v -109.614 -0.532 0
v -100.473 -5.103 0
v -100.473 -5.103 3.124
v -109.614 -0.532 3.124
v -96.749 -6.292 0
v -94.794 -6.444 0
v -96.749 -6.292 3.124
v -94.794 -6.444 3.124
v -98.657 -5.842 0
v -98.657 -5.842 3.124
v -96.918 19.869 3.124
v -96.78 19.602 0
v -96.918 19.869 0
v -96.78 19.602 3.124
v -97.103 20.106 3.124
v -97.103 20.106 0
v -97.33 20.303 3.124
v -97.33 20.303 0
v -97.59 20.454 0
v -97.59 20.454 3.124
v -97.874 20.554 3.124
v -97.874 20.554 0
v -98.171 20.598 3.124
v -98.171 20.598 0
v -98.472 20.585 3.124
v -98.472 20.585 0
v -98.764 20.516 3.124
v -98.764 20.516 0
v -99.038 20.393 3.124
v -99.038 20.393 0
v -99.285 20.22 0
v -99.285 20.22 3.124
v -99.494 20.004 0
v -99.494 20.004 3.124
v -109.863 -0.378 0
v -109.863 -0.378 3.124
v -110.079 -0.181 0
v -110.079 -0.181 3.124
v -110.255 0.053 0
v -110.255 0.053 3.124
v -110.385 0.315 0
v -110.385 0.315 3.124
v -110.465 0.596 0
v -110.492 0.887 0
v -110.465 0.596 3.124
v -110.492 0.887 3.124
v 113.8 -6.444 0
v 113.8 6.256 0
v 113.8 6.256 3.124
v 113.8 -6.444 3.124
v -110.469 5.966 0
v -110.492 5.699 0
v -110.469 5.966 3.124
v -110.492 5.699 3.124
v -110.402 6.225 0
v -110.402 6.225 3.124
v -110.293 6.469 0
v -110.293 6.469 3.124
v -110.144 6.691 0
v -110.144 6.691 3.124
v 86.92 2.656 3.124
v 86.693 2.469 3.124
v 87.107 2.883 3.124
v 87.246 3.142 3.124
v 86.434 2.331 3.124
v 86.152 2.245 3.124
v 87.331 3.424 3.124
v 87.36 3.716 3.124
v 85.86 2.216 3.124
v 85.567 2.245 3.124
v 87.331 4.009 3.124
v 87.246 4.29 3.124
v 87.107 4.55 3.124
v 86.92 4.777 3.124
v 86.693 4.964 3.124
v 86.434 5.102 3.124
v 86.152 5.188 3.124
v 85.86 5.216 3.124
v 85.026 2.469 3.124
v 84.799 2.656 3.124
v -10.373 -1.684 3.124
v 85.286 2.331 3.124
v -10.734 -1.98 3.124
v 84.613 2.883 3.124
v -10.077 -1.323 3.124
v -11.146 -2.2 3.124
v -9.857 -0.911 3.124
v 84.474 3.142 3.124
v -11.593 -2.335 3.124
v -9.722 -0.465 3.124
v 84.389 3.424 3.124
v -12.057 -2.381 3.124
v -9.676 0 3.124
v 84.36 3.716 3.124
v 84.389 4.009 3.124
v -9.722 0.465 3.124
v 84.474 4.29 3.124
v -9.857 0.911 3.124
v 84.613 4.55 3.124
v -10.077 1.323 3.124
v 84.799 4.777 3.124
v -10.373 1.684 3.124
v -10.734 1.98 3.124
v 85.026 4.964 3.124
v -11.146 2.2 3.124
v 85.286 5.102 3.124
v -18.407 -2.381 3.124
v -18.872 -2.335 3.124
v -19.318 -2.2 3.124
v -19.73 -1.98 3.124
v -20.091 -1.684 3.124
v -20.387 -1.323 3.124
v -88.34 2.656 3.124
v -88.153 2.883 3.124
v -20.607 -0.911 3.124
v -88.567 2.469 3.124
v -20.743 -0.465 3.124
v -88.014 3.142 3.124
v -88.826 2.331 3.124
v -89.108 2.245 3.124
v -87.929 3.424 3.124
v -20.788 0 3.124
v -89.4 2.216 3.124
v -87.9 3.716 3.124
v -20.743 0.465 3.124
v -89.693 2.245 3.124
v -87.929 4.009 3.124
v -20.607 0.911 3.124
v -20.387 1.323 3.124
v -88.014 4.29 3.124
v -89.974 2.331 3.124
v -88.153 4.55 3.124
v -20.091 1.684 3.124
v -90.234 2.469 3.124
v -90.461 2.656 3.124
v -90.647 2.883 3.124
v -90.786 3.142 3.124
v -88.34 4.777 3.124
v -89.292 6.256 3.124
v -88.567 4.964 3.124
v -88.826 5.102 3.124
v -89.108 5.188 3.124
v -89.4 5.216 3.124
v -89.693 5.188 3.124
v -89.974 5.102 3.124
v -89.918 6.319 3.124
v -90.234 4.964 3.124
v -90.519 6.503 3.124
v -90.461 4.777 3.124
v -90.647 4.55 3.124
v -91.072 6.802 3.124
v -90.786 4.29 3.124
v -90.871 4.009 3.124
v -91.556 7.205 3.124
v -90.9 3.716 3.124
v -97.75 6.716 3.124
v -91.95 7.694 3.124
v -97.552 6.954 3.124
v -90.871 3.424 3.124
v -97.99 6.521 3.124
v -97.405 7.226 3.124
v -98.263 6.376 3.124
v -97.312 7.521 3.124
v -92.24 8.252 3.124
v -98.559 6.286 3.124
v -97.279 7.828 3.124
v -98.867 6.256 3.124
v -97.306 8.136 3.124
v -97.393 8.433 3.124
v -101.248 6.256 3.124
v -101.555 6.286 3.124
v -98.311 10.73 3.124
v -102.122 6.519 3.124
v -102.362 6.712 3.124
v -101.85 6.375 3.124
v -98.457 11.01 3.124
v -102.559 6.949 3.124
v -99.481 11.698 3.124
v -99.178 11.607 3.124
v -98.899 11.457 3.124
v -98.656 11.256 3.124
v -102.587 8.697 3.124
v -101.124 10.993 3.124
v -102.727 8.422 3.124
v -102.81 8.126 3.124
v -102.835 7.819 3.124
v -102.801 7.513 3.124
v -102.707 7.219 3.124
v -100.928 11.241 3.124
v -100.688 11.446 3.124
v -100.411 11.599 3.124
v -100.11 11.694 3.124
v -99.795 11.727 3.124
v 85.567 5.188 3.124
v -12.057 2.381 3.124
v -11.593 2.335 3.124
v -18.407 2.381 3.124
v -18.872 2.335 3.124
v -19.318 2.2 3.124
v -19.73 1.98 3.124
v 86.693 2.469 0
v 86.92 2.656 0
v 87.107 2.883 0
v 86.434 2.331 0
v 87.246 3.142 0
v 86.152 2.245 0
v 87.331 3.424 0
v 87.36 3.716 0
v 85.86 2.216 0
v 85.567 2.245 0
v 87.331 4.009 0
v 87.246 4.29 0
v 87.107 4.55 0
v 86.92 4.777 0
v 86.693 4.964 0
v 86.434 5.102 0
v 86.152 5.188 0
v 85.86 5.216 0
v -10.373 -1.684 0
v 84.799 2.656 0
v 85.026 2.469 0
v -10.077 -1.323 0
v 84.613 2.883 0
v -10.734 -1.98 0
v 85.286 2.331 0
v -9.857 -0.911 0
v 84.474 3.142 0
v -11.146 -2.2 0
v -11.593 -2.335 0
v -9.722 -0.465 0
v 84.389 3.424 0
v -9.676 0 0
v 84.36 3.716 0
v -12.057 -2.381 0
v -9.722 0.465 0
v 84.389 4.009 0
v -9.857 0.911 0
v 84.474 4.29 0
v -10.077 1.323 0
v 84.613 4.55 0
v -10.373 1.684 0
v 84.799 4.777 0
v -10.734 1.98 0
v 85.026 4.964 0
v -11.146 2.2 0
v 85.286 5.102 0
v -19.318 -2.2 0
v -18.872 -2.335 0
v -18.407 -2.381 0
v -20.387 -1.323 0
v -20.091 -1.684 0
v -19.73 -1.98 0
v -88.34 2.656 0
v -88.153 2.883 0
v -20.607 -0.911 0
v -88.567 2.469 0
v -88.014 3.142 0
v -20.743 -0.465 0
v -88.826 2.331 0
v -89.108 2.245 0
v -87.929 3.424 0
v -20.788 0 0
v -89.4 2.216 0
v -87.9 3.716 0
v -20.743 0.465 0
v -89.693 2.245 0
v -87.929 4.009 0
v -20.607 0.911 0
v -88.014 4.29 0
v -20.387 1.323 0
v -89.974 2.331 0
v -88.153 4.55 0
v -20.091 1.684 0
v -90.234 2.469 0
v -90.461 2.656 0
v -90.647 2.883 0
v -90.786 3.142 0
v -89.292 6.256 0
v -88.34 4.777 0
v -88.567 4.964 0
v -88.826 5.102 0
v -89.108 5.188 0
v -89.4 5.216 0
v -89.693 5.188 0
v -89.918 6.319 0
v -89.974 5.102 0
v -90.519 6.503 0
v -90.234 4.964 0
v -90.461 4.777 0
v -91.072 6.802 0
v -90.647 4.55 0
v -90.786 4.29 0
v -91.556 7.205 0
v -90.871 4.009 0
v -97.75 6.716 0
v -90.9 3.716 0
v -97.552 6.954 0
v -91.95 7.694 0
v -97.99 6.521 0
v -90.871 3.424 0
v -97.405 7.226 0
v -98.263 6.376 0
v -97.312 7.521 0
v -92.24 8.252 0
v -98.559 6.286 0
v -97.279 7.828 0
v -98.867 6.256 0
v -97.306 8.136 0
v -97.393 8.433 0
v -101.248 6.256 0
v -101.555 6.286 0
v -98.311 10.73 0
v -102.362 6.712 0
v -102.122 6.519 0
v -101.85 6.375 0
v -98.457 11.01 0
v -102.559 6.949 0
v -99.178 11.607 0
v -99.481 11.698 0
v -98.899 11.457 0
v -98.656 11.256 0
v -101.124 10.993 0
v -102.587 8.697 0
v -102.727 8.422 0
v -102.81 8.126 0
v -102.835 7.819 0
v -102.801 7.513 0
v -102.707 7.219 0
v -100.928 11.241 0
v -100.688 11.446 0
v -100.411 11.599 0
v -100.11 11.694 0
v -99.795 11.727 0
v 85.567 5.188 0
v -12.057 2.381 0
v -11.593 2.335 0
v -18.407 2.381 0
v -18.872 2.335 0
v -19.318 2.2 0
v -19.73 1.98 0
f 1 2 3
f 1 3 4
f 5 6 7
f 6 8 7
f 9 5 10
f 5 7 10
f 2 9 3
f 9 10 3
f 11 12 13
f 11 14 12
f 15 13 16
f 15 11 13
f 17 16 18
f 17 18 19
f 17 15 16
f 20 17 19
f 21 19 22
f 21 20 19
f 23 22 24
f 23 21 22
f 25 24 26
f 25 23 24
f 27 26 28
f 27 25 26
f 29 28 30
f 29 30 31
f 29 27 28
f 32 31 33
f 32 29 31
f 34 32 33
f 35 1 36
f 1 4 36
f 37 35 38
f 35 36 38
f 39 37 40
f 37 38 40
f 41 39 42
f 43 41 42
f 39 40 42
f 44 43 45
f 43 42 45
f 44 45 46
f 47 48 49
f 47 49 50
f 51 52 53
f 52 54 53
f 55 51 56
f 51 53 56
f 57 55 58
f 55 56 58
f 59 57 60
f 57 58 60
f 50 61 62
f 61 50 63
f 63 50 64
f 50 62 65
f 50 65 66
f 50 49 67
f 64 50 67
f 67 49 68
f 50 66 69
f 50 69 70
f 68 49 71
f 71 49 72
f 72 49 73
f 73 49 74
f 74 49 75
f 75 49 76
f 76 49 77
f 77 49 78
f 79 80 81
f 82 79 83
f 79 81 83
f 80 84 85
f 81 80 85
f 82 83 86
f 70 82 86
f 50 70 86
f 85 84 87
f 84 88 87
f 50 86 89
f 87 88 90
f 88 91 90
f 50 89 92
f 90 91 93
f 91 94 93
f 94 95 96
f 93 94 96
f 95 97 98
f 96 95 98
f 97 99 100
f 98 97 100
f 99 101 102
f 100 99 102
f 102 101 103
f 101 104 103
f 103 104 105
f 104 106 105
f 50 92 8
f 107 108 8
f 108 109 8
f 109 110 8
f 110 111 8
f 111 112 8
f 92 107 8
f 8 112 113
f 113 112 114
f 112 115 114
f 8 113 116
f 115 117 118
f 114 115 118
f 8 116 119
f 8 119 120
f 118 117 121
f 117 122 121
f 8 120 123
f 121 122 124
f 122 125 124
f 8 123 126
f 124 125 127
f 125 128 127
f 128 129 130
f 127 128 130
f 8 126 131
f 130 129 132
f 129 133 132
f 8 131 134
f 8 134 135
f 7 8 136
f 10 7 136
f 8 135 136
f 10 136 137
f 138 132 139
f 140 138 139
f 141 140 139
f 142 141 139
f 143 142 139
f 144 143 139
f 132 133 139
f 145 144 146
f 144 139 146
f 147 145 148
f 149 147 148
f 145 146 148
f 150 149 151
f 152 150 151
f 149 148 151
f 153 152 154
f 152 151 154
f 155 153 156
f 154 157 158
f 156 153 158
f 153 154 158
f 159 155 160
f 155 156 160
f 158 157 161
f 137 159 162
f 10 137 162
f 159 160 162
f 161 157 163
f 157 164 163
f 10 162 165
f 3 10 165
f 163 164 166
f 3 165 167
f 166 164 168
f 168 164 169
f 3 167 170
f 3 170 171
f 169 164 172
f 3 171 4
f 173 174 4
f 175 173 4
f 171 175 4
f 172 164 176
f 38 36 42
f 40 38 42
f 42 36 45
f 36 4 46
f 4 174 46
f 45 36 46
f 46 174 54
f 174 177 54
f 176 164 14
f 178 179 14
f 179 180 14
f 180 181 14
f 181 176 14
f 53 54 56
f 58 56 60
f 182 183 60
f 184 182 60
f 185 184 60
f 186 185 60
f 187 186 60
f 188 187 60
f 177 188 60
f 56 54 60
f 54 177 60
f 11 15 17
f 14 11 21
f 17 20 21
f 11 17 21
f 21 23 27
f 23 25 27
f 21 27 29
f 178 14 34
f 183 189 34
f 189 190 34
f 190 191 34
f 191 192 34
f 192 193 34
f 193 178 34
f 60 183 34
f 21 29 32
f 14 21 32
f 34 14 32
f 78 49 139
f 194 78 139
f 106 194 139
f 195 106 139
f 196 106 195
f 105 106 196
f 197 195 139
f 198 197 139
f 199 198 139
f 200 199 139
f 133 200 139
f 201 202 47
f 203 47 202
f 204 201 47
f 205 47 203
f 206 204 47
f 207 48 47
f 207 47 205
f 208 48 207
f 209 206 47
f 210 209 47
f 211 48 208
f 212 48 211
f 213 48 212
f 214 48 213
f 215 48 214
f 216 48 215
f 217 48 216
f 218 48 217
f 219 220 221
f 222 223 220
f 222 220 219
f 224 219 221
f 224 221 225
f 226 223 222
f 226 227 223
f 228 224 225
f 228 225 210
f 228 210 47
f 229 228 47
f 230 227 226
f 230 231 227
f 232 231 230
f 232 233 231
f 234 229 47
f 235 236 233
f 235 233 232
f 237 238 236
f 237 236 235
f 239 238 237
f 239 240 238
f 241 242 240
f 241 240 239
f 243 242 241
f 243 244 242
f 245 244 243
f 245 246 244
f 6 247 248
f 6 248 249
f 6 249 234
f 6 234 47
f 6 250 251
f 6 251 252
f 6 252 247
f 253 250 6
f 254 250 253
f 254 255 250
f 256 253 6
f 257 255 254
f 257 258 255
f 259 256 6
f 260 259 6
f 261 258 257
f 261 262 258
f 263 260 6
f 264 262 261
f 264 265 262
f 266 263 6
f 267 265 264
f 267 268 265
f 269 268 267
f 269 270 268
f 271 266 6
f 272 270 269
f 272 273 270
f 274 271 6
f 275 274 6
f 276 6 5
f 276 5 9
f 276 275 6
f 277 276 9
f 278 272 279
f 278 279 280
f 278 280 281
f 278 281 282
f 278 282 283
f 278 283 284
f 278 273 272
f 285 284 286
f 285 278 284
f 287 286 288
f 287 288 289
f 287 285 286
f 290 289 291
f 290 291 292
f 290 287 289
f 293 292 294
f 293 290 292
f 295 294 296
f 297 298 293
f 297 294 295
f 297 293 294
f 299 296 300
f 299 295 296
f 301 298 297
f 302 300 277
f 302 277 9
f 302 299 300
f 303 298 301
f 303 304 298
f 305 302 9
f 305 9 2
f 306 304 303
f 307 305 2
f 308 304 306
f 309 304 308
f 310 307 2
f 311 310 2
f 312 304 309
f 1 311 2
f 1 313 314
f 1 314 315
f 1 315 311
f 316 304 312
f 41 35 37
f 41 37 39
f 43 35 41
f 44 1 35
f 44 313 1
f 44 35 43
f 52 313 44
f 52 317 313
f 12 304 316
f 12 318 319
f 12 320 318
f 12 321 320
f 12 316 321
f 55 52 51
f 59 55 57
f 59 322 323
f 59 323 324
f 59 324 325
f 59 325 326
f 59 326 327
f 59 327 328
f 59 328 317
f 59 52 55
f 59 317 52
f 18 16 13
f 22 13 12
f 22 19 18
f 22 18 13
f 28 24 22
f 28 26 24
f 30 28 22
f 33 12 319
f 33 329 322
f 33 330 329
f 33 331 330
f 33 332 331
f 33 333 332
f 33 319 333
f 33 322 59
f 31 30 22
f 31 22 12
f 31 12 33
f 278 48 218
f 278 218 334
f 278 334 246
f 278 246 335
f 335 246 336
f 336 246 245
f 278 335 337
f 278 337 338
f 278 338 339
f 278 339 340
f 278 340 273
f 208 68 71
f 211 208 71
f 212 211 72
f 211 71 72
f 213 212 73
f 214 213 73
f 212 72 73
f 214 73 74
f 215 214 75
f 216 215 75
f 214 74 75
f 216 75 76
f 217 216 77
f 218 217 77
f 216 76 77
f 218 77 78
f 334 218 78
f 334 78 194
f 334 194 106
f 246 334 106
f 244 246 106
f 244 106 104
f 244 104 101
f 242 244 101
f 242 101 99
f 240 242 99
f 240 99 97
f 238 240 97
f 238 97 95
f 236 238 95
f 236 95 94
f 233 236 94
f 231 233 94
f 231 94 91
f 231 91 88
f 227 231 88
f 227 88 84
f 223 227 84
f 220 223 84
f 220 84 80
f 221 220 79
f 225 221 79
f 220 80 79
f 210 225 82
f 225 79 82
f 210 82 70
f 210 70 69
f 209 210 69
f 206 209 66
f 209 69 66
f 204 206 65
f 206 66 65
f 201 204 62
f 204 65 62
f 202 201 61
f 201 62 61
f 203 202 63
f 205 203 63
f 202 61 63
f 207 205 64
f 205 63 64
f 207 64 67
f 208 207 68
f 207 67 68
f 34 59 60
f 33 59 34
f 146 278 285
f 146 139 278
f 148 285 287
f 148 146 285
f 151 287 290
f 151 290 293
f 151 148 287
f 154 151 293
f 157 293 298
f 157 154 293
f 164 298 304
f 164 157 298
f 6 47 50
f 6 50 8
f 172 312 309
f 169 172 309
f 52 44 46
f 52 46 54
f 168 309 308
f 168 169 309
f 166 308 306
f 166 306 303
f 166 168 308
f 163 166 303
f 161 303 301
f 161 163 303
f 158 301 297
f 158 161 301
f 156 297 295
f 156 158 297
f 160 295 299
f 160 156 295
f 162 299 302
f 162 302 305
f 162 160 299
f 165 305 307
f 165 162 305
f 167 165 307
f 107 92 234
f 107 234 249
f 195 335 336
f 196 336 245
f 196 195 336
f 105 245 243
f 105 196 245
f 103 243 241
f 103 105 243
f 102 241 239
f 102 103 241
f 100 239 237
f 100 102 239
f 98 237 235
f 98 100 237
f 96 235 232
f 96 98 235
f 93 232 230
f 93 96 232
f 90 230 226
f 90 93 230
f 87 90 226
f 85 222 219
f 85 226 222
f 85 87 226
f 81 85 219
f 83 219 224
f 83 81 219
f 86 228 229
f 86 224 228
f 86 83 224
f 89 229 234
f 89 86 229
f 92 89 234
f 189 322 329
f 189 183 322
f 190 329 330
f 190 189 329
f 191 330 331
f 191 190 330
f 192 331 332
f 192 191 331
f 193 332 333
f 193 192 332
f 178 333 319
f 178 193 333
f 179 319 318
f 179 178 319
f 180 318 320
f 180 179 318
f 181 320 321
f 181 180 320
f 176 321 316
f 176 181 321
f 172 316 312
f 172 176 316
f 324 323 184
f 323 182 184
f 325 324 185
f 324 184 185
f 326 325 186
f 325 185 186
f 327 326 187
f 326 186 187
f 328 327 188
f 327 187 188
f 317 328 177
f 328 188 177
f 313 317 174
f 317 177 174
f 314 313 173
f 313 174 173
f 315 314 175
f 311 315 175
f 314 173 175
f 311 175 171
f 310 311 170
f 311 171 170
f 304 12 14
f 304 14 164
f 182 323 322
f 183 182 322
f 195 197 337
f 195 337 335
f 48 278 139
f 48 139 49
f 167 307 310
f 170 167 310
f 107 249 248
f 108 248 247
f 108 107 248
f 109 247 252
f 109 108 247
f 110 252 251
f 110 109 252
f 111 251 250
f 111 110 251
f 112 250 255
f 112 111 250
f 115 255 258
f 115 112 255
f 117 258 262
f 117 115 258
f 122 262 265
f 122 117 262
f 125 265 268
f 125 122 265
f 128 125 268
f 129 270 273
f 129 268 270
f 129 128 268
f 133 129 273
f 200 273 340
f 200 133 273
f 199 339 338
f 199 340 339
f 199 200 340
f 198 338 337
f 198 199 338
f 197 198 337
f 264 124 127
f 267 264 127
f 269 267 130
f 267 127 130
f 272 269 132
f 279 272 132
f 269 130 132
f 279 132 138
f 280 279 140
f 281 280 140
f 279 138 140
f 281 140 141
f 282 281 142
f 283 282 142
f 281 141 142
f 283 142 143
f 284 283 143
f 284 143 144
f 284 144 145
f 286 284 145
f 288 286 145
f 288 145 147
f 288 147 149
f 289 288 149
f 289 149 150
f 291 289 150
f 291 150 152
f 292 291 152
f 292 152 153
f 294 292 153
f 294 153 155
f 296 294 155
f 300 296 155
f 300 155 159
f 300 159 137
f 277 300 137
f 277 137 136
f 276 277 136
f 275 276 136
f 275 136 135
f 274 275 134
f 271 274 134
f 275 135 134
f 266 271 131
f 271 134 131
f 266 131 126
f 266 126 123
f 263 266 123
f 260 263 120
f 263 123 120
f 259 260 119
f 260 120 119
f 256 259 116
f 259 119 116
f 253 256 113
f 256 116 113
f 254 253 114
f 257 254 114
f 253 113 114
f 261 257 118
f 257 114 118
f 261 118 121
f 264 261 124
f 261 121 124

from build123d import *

# Parameters (mm, degrees)
BOSS_EXTRUDE1_DEPTH = 3.1242
FILLET4_R           = 12.7
FILLET8_R           = 1.5875
FILLET9_R           = 3.175
CUT_EXTRUDE1_DEPTH  = 116.691473387
SKETCH3_R           = 1.5
CUT_EXTRUDE2_DEPTH  = 116.691473387


with BuildPart() as part:
    # Sketch1 → Boss-Extrude1 (new body)
    with BuildSketch(Plane.XY):
        Polygon((113.799832915, -6.443650697), (-97.791946085, -6.443650697), (-110.491946085, -0.093650697), (-110.491946085, 6.256349303), (-97.791946085, 22.131349303), (-91.441946085, 6.256349303), (113.799832915, 6.256349303), align=None)
        Polygon((-104.141946085, 6.256349303), (-99.460780317, 13.603434884), (-96.521946085, 6.256349303), align=None, mode=Mode.SUBTRACT)
    extrude(amount=BOSS_EXTRUDE1_DEPTH)

    # Fillet4
    fillet4_edges = [part.edges().sort_by_distance(p)[0] for p in [
        (-97.791946085, -6.443650697, 1.5621),
    ]]
    fillet(fillet4_edges, radius=FILLET4_R)

    # Fillet8
    fillet8_edges = [part.edges().sort_by_distance(p)[0] for p in [
        (-110.491946085, 6.256349303, 1.5621),
        (-97.791946085, 22.131349303, 1.5621),
        (-110.491946085, -0.093650697, 1.5621),
        (-104.141946085, 6.256349303, 1.5621),
        (-96.521946085, 6.256349303, 1.5621),
        (-99.460780317, 13.603434884, 1.5621),
    ]]
    fillet(fillet8_edges, radius=FILLET8_R)

    # Fillet9
    fillet9_edges = [part.edges().sort_by_distance(p)[0] for p in [
        (-91.441946085, 6.256349303, 1.5621),
    ]]
    fillet(fillet9_edges, radius=FILLET9_R)

    # Sketch2 → Cut-Extrude1 (cut, through all)
    with BuildSketch(Plane.XY.offset(3.1242)):
        with BuildLine():
            Line((-18.407167085, 2.38125), (-12.057167085, 2.38125))
            ThreePointArc((-12.057167085, 2.38125), (-9.675917085, 0), (-12.057167085, -2.38125))
            Line((-12.057167085, -2.38125), (-18.407167085, -2.38125))
            ThreePointArc((-18.407167085, -2.38125), (-20.788417085, 0), (-18.407167085, 2.38125))
        make_face()
    extrude(amount=-CUT_EXTRUDE1_DEPTH, mode=Mode.SUBTRACT)

    # Sketch3 → Cut-Extrude2 (cut, through all)
    with BuildSketch(Plane.XY.offset(3.1242)):
        with Locations((85.859832915, 3.716349303)):
            Circle(SKETCH3_R)
        with Locations((-89.400167085, 3.716349303)):
            Circle(SKETCH3_R)
    extrude(amount=-CUT_EXTRUDE2_DEPTH, mode=Mode.SUBTRACT)


solid = part.part
